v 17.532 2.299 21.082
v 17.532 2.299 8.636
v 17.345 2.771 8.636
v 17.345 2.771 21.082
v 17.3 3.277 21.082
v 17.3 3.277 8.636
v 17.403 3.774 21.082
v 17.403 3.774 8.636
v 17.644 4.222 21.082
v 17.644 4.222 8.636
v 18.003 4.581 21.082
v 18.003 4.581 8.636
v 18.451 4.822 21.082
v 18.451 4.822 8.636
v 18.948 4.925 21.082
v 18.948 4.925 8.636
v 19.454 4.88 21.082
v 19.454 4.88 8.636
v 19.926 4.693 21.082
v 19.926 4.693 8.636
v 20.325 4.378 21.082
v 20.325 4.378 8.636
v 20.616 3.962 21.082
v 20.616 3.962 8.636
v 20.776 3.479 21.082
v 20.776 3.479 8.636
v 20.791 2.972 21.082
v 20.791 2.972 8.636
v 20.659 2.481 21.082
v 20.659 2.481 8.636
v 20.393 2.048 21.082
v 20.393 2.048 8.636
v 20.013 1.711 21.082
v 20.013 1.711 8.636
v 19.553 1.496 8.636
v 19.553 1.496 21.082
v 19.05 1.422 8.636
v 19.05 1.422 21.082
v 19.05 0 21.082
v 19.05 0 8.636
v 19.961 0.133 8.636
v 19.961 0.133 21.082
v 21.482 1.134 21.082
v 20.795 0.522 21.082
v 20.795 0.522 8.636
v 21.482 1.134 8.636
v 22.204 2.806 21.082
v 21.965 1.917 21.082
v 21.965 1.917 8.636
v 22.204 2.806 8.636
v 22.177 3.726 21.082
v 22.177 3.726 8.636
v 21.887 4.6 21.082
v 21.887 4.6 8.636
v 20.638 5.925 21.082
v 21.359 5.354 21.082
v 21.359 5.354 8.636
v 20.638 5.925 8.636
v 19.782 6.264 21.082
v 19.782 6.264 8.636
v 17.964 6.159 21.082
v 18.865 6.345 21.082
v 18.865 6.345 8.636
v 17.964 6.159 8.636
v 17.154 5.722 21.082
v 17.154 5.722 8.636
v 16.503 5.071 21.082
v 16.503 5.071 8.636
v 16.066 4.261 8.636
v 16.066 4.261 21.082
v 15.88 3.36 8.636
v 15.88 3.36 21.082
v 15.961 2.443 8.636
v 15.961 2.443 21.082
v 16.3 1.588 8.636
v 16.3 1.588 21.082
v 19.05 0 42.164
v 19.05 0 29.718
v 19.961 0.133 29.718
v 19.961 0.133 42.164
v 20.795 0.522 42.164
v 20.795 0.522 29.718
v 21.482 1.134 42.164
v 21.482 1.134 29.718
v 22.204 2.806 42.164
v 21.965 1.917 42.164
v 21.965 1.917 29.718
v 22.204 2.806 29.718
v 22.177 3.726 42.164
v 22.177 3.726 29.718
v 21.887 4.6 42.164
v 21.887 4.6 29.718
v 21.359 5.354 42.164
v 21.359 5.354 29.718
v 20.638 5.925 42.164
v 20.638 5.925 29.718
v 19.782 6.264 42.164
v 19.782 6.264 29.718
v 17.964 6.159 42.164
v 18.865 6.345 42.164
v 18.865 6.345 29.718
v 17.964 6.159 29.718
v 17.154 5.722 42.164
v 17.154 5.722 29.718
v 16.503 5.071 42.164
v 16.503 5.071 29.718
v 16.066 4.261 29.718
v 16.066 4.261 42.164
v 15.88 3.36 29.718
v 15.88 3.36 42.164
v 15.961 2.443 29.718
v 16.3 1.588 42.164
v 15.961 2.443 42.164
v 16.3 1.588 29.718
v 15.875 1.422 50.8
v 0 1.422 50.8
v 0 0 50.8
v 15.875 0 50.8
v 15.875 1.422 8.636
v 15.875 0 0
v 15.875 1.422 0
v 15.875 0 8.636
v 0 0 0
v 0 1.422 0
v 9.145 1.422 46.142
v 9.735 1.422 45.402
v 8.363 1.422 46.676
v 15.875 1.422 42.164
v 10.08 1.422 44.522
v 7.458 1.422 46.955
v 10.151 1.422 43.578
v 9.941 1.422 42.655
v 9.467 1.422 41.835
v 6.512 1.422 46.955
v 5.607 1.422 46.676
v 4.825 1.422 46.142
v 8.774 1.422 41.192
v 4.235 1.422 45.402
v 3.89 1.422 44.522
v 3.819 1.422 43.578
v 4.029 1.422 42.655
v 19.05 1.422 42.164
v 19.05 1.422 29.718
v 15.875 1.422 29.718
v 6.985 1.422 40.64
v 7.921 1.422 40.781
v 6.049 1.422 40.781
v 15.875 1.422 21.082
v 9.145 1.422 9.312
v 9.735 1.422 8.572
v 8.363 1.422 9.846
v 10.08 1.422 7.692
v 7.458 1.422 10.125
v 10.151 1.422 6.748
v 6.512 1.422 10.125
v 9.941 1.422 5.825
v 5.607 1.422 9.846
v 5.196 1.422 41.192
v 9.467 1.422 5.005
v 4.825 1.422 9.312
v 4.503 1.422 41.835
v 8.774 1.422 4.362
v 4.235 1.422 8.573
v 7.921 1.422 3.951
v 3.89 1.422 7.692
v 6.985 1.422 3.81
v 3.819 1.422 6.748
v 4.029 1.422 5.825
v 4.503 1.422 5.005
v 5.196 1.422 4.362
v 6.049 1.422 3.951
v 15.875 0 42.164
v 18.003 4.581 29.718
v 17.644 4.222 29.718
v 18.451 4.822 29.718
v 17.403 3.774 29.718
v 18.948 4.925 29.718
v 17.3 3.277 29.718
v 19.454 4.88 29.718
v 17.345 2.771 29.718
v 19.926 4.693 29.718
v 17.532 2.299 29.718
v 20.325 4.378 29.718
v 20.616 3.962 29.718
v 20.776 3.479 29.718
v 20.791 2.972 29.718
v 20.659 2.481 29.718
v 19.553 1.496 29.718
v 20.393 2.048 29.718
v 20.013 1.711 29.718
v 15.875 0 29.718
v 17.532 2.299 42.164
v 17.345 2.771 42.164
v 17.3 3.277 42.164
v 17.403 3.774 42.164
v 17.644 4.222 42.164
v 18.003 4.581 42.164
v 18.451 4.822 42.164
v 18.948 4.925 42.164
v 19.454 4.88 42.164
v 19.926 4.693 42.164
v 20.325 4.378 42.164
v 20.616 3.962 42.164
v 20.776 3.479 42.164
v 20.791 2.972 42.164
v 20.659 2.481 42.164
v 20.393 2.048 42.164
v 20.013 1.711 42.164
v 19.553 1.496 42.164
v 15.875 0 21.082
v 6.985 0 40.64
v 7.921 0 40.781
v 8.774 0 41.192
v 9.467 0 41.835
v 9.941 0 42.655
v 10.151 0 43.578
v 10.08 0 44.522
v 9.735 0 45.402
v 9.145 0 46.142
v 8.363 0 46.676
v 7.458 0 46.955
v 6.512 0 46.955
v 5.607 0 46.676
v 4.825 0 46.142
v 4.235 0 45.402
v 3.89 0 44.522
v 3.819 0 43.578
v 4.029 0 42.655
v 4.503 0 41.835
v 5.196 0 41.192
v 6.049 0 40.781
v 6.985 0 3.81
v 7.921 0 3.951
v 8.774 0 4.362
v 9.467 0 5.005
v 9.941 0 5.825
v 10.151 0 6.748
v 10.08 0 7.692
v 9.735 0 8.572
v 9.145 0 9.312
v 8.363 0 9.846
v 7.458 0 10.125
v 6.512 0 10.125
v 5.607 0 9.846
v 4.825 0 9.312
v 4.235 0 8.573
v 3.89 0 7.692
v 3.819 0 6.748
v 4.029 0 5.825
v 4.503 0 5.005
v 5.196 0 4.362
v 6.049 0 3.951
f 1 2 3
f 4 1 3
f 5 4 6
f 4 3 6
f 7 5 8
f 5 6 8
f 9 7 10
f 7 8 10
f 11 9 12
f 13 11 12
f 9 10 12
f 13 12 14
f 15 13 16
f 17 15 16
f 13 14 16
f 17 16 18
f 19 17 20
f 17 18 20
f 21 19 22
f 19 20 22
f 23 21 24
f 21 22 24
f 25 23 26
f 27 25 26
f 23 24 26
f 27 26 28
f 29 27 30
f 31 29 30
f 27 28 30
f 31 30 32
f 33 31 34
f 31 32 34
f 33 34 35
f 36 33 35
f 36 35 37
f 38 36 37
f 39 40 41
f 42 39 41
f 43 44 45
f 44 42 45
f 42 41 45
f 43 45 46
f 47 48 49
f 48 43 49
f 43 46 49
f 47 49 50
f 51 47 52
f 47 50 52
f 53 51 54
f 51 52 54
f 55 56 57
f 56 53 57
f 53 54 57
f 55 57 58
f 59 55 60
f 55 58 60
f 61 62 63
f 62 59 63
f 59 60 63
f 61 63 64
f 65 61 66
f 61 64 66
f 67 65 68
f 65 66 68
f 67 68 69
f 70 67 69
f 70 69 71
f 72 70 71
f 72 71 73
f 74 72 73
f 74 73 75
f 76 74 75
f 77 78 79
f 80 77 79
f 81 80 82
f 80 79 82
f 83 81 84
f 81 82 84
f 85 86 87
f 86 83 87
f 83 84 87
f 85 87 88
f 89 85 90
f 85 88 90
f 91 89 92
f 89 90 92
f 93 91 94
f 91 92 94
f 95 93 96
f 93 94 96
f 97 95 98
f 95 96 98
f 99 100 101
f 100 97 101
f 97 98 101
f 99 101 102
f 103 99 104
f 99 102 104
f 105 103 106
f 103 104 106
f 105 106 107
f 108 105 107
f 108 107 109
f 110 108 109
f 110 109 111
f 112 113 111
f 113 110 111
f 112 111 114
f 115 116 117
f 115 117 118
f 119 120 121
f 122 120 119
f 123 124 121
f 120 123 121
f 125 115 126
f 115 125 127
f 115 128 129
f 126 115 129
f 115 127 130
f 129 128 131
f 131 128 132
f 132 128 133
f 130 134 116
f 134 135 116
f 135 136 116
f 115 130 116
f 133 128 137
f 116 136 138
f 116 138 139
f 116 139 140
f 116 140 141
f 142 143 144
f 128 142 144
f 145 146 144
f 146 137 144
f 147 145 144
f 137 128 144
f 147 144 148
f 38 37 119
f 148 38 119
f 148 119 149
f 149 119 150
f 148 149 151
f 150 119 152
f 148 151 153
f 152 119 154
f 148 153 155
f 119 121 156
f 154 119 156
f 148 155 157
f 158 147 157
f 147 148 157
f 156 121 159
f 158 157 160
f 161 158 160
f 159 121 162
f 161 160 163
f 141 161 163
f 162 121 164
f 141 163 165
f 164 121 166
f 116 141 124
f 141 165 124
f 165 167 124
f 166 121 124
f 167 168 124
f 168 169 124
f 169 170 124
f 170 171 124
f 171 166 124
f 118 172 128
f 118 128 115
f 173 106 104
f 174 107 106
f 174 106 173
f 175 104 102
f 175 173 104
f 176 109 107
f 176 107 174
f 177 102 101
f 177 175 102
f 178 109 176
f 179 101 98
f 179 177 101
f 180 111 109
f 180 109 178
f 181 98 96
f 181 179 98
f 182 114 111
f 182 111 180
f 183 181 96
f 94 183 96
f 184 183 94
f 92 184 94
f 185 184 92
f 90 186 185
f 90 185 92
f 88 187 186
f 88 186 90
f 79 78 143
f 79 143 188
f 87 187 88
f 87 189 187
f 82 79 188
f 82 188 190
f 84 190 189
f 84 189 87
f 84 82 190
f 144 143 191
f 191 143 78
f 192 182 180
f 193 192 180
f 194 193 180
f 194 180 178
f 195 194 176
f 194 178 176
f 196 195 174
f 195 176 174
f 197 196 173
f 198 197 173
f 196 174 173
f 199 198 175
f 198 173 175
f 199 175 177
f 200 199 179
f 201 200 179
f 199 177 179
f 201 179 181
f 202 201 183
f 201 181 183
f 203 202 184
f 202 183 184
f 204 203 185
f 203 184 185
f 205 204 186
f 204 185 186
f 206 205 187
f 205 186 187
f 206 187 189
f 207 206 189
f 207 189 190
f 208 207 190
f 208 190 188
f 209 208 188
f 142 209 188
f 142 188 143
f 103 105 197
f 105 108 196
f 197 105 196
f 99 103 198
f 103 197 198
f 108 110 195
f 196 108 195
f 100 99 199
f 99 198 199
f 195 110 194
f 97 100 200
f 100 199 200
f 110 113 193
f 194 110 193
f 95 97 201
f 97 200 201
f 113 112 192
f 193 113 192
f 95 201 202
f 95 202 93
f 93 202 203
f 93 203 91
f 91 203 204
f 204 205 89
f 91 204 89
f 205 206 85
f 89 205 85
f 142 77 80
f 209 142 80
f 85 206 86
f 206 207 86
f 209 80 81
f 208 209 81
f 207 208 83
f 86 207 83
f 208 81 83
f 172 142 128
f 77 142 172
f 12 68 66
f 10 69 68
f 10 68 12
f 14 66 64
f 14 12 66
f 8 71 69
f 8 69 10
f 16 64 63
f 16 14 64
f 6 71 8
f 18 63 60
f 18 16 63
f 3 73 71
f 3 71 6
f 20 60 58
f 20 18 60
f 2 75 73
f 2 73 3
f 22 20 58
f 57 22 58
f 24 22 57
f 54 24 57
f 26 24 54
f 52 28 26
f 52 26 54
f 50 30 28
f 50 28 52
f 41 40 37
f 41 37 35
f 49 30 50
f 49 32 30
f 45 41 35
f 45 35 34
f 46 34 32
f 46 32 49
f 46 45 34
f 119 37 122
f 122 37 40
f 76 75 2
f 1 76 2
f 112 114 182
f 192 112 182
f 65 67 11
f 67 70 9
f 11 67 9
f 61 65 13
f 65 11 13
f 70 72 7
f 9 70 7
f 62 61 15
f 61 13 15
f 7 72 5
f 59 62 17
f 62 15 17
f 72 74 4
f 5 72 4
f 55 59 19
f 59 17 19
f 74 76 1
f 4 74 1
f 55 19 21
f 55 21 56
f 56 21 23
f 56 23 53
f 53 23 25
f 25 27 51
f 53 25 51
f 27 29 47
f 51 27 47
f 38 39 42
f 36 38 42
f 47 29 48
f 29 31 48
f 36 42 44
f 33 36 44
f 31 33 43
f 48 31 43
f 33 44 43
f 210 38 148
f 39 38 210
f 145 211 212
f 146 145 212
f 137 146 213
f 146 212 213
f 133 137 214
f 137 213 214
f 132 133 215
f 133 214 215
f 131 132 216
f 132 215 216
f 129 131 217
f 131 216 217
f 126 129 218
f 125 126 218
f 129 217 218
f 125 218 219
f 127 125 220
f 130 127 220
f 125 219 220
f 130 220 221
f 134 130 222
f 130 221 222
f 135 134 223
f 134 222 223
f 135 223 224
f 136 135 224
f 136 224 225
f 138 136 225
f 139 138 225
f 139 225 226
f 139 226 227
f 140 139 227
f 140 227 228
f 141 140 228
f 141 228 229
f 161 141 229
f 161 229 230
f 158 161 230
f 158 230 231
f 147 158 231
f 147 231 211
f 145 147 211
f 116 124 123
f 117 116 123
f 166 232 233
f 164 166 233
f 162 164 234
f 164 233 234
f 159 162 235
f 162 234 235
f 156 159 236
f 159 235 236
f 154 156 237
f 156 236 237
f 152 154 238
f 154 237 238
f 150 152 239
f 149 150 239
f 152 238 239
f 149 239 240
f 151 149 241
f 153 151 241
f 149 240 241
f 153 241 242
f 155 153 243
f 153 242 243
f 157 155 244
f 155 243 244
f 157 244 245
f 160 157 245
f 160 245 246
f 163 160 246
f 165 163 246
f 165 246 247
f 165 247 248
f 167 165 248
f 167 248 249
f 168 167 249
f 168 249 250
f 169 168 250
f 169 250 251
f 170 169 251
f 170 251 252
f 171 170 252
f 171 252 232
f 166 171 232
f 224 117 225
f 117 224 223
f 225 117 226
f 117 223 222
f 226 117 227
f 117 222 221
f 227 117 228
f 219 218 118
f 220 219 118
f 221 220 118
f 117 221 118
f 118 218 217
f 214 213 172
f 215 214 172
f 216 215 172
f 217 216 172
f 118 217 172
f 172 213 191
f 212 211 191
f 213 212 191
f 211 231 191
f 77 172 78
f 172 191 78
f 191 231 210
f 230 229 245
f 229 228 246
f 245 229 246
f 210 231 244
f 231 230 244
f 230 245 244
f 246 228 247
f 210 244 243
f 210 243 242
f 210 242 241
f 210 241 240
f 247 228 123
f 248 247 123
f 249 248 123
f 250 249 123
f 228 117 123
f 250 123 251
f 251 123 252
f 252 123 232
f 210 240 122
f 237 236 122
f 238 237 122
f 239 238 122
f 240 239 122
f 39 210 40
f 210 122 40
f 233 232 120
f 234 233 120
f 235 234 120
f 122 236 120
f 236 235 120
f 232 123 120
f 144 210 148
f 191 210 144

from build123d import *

# Parameters (mm, degrees)
BOSS_EXTRUDE1_DEPTH = 50.8
SKETCH2_R           = 3.175
SKETCH2_W           = 6.35
SKETCH2_H           = 8.636
CUT_EXTRUDE1_DEPTH  = 56.811406764


with BuildPart() as part:
    # Sketch1 → Boss-Extrude1 (new body)
    with BuildSketch(Plane.XY):
        with BuildLine():
            Line((0, 0), (19.05, 0))
            ThreePointArc((19.05, 0), (20.6375, 5.924630657), (16.300369343, 1.5875))
            Line((16.300369343, 1.5875), (17.532203877, 2.2987))
            ThreePointArc((17.532203877, 2.2987), (19.9263, 4.692796123), (19.05, 1.4224))
            Line((19.05, 1.4224), (0, 1.4224))
            Line((0, 1.4224), (0, 0))
        make_face()
    extrude(amount=BOSS_EXTRUDE1_DEPTH)

    # Sketch2 → Cut-Extrude1 (cut, through all)
    with BuildSketch(Plane.XZ):
        with Locations(Location((6.985, 43.815, 0), (0, 0, 270))):
            Circle(SKETCH2_R)
        with Locations(Location((6.985, 6.985, 0), (0, 0, 270))):
            Circle(SKETCH2_R)
        with Locations((19.05, 46.482)):
            Rectangle(SKETCH2_W, SKETCH2_H)
        with Locations((19.05, 25.4)):
            Rectangle(SKETCH2_W, SKETCH2_H)
        with Locations((19.05, 4.318)):
            Rectangle(SKETCH2_W, SKETCH2_H)
    extrude(amount=-CUT_EXTRUDE1_DEPTH, mode=Mode.SUBTRACT)


solid = part.part
